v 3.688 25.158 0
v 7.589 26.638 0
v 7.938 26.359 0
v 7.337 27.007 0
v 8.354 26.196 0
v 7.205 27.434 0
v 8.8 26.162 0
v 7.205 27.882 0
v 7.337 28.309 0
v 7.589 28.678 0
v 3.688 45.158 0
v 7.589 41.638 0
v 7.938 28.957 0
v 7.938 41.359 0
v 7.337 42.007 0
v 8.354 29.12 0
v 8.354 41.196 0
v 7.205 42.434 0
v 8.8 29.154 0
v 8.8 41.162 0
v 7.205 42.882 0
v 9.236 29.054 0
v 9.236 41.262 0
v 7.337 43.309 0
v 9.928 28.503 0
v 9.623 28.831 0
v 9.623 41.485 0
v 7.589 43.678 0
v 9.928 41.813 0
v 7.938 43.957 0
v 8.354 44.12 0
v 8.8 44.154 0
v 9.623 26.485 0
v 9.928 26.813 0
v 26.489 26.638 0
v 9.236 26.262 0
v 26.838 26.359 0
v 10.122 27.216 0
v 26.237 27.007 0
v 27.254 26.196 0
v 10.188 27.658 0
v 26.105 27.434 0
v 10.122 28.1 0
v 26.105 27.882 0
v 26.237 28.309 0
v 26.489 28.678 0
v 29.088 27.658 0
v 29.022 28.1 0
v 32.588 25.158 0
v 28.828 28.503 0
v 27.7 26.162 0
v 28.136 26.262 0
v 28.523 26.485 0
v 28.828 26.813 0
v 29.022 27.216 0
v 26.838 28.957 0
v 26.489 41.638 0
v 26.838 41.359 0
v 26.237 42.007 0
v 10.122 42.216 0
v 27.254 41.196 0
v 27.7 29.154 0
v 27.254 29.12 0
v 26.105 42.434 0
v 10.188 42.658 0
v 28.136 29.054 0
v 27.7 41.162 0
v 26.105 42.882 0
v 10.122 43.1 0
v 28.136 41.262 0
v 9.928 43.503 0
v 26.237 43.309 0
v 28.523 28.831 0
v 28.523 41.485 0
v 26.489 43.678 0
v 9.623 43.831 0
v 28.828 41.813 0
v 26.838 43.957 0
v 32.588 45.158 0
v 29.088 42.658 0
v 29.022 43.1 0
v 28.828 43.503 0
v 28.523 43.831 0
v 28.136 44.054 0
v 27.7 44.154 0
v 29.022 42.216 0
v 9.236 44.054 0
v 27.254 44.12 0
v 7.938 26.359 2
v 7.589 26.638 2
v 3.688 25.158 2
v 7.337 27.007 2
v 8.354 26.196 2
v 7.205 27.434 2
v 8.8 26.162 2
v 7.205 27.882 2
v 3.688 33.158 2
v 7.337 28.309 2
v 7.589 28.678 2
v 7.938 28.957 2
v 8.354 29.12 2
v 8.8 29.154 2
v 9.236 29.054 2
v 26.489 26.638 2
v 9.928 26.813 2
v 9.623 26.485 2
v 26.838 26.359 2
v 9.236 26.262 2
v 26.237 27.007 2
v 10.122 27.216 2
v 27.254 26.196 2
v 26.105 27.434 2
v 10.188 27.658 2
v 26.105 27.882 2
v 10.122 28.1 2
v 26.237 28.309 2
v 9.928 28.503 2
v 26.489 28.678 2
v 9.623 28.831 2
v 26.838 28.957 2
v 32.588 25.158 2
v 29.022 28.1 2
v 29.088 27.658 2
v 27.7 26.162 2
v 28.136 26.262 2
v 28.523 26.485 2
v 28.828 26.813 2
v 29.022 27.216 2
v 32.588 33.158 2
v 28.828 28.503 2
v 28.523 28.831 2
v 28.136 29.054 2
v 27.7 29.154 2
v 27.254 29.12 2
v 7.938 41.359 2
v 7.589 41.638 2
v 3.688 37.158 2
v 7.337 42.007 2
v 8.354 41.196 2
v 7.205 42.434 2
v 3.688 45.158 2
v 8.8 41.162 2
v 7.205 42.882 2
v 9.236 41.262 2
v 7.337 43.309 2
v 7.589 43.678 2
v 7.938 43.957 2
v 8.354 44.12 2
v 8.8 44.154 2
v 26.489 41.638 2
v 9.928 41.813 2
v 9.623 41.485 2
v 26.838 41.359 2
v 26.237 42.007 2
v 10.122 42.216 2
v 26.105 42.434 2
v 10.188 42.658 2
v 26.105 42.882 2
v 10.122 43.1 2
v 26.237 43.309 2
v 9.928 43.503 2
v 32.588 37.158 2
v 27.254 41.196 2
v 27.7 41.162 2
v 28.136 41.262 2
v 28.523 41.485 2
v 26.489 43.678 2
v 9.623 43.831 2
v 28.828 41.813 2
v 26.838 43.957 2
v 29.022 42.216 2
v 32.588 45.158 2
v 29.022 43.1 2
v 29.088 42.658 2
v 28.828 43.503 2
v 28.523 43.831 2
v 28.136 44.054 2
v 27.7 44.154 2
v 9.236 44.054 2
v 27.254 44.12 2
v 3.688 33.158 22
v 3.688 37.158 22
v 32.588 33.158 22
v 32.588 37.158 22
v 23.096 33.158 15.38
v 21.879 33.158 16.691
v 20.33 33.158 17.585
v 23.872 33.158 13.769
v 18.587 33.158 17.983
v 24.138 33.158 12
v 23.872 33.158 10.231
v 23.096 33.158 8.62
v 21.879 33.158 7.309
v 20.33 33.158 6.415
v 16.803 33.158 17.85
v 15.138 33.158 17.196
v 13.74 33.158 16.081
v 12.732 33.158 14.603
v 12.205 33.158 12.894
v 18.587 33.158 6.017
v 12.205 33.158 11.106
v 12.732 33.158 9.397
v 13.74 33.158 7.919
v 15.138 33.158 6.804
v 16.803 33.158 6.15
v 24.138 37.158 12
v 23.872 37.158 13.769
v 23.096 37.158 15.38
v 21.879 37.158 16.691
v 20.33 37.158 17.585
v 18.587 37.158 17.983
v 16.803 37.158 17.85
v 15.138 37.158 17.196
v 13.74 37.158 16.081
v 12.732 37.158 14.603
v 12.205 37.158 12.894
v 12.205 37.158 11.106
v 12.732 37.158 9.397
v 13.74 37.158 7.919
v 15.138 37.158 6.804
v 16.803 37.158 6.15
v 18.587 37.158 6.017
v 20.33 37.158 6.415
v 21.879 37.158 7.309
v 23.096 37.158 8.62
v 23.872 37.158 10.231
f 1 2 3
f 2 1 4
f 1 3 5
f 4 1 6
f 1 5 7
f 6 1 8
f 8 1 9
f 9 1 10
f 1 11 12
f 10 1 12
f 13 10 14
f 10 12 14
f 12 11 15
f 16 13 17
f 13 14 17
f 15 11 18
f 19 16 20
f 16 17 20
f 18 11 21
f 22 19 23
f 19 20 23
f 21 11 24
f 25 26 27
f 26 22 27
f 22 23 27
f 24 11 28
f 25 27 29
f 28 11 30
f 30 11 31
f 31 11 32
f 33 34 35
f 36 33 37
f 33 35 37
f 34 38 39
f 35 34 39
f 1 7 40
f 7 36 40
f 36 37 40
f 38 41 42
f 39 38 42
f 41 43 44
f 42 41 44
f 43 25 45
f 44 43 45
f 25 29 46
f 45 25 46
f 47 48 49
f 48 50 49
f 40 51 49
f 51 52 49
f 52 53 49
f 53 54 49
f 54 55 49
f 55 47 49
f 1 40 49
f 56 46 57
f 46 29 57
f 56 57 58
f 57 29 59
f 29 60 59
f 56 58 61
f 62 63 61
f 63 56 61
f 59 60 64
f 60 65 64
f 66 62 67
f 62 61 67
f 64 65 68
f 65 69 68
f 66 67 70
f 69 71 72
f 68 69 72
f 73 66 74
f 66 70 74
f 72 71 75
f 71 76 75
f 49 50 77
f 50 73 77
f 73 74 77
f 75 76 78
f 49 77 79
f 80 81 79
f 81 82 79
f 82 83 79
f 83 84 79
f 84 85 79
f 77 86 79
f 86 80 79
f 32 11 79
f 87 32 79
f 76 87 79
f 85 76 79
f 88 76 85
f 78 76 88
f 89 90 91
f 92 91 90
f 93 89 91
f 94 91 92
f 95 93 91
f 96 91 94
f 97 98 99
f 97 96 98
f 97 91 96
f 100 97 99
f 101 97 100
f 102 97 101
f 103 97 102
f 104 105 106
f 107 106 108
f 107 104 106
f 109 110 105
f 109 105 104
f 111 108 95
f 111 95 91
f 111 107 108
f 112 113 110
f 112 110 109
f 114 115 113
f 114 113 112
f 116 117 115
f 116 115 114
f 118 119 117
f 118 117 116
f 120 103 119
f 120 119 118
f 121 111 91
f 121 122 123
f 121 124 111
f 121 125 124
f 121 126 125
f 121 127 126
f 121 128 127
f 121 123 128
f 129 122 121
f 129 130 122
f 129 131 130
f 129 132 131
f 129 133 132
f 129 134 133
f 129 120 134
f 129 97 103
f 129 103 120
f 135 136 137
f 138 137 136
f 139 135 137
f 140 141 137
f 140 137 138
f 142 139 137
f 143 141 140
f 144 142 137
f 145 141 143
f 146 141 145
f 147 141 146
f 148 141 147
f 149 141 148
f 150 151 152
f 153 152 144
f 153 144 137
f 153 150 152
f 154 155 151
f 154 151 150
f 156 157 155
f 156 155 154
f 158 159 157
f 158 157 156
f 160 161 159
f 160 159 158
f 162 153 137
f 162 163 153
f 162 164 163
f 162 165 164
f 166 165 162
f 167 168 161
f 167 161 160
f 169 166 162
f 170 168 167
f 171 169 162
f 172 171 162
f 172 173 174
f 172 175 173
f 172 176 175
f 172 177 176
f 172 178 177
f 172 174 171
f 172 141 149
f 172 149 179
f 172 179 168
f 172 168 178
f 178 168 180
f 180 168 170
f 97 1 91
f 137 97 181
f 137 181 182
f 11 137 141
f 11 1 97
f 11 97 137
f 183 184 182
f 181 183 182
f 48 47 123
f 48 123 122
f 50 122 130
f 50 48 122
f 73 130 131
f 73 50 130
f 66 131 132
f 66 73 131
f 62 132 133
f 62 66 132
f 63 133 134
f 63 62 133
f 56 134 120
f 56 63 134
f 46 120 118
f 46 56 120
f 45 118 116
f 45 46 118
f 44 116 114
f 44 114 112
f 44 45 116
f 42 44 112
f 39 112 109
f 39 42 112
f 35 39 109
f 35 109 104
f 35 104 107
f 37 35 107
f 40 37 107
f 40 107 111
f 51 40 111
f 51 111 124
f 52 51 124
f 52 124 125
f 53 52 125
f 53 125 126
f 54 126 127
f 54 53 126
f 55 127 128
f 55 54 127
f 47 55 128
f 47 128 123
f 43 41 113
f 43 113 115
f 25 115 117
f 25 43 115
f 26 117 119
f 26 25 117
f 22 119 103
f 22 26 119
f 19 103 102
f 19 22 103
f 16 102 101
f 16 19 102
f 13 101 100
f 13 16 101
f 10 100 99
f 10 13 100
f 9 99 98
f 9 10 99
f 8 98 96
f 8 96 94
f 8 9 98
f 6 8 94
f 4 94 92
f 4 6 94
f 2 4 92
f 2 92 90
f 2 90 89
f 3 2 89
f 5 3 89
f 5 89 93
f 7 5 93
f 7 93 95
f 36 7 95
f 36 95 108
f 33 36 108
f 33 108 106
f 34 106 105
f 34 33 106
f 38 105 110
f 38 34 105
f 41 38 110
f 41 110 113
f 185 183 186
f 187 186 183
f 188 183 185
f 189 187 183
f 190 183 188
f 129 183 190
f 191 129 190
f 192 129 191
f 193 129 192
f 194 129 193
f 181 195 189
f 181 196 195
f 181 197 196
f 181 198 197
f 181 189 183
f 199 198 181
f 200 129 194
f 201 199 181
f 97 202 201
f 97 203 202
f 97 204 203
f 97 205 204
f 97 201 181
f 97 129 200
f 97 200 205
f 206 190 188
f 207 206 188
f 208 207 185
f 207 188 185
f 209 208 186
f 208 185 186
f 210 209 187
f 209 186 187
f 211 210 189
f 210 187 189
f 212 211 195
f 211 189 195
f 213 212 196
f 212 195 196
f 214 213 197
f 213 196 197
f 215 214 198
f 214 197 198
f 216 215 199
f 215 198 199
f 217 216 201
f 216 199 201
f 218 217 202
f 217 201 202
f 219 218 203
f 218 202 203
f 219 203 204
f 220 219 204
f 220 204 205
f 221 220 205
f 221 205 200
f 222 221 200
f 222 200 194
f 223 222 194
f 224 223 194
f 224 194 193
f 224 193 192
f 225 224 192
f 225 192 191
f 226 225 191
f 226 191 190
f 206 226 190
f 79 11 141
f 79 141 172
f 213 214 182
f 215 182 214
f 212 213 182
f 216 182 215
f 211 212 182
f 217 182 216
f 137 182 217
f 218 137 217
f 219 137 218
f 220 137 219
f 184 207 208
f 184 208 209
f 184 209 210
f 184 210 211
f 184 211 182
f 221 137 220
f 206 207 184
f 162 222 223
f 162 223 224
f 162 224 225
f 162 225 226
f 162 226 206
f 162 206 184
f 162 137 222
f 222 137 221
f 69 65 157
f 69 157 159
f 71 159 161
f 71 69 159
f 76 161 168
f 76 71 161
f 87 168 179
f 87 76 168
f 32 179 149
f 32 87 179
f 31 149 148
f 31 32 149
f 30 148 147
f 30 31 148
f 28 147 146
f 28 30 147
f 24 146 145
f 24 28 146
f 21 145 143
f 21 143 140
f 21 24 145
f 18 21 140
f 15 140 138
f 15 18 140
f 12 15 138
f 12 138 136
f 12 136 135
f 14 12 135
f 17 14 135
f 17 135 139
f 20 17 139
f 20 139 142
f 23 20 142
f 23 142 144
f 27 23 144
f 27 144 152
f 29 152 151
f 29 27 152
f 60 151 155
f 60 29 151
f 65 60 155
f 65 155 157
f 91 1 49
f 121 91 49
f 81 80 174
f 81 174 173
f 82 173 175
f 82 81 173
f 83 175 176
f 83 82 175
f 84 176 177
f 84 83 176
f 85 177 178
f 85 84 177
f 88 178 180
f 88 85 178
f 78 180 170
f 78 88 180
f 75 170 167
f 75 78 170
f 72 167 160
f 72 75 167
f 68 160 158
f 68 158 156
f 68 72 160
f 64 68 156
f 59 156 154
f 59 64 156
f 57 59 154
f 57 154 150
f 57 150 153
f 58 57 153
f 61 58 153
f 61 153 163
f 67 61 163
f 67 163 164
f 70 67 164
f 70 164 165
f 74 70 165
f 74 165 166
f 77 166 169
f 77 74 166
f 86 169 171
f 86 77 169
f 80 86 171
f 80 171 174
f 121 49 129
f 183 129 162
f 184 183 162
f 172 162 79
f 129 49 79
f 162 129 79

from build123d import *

# Parameters (mm, degrees)
SKETCH_1_W          = 28.9
SKETCH_1_H          = 20
SKETCH_1_R          = 1.5
EXTRUDE_1_DEPTH     = 2
EXTRUDE_2_DEPTH     = 20
SKETCH_4_R          = 6
CUT_EXTRUDE_1_DEPTH = 10


with BuildPart() as part:
    # 草图1 → 凸台-拉伸1 (new body)
    with BuildSketch(Plane.XY):
        with Locations((18.138262449, 35.158029485)):
            Rectangle(SKETCH_1_W, SKETCH_1_H)
        with Locations((27.588262449, 42.658029485)):
            Circle(SKETCH_1_R, mode=Mode.SUBTRACT)
        with Locations((8.688262449, 42.658029485)):
            Circle(SKETCH_1_R, mode=Mode.SUBTRACT)
        with Locations((8.688262449, 27.658029485)):
            Circle(SKETCH_1_R, mode=Mode.SUBTRACT)
        with Locations((27.588262449, 27.658029485)):
            Circle(SKETCH_1_R, mode=Mode.SUBTRACT)
    extrude(amount=EXTRUDE_1_DEPTH)

    # 草图2 → 凸台-拉伸2 (add)
    with BuildSketch(Plane.XY.offset(2)):
        Polygon((3.688262449, 35.158029485), (3.688262449, 37.158029485), (32.588262449, 37.158029485), (32.588262449, 33.158029485), (3.688262449, 33.158029485), align=None)
    extrude(amount=EXTRUDE_2_DEPTH)

    # 草图4 → 切除-拉伸1 (cut)
    with BuildSketch(Plane.XZ.offset(-33.158029485)):
        with Locations((18.138262449, 12)):
            Circle(SKETCH_4_R)
    extrude(amount=-CUT_EXTRUDE_1_DEPTH, mode=Mode.SUBTRACT)


solid = part.part
